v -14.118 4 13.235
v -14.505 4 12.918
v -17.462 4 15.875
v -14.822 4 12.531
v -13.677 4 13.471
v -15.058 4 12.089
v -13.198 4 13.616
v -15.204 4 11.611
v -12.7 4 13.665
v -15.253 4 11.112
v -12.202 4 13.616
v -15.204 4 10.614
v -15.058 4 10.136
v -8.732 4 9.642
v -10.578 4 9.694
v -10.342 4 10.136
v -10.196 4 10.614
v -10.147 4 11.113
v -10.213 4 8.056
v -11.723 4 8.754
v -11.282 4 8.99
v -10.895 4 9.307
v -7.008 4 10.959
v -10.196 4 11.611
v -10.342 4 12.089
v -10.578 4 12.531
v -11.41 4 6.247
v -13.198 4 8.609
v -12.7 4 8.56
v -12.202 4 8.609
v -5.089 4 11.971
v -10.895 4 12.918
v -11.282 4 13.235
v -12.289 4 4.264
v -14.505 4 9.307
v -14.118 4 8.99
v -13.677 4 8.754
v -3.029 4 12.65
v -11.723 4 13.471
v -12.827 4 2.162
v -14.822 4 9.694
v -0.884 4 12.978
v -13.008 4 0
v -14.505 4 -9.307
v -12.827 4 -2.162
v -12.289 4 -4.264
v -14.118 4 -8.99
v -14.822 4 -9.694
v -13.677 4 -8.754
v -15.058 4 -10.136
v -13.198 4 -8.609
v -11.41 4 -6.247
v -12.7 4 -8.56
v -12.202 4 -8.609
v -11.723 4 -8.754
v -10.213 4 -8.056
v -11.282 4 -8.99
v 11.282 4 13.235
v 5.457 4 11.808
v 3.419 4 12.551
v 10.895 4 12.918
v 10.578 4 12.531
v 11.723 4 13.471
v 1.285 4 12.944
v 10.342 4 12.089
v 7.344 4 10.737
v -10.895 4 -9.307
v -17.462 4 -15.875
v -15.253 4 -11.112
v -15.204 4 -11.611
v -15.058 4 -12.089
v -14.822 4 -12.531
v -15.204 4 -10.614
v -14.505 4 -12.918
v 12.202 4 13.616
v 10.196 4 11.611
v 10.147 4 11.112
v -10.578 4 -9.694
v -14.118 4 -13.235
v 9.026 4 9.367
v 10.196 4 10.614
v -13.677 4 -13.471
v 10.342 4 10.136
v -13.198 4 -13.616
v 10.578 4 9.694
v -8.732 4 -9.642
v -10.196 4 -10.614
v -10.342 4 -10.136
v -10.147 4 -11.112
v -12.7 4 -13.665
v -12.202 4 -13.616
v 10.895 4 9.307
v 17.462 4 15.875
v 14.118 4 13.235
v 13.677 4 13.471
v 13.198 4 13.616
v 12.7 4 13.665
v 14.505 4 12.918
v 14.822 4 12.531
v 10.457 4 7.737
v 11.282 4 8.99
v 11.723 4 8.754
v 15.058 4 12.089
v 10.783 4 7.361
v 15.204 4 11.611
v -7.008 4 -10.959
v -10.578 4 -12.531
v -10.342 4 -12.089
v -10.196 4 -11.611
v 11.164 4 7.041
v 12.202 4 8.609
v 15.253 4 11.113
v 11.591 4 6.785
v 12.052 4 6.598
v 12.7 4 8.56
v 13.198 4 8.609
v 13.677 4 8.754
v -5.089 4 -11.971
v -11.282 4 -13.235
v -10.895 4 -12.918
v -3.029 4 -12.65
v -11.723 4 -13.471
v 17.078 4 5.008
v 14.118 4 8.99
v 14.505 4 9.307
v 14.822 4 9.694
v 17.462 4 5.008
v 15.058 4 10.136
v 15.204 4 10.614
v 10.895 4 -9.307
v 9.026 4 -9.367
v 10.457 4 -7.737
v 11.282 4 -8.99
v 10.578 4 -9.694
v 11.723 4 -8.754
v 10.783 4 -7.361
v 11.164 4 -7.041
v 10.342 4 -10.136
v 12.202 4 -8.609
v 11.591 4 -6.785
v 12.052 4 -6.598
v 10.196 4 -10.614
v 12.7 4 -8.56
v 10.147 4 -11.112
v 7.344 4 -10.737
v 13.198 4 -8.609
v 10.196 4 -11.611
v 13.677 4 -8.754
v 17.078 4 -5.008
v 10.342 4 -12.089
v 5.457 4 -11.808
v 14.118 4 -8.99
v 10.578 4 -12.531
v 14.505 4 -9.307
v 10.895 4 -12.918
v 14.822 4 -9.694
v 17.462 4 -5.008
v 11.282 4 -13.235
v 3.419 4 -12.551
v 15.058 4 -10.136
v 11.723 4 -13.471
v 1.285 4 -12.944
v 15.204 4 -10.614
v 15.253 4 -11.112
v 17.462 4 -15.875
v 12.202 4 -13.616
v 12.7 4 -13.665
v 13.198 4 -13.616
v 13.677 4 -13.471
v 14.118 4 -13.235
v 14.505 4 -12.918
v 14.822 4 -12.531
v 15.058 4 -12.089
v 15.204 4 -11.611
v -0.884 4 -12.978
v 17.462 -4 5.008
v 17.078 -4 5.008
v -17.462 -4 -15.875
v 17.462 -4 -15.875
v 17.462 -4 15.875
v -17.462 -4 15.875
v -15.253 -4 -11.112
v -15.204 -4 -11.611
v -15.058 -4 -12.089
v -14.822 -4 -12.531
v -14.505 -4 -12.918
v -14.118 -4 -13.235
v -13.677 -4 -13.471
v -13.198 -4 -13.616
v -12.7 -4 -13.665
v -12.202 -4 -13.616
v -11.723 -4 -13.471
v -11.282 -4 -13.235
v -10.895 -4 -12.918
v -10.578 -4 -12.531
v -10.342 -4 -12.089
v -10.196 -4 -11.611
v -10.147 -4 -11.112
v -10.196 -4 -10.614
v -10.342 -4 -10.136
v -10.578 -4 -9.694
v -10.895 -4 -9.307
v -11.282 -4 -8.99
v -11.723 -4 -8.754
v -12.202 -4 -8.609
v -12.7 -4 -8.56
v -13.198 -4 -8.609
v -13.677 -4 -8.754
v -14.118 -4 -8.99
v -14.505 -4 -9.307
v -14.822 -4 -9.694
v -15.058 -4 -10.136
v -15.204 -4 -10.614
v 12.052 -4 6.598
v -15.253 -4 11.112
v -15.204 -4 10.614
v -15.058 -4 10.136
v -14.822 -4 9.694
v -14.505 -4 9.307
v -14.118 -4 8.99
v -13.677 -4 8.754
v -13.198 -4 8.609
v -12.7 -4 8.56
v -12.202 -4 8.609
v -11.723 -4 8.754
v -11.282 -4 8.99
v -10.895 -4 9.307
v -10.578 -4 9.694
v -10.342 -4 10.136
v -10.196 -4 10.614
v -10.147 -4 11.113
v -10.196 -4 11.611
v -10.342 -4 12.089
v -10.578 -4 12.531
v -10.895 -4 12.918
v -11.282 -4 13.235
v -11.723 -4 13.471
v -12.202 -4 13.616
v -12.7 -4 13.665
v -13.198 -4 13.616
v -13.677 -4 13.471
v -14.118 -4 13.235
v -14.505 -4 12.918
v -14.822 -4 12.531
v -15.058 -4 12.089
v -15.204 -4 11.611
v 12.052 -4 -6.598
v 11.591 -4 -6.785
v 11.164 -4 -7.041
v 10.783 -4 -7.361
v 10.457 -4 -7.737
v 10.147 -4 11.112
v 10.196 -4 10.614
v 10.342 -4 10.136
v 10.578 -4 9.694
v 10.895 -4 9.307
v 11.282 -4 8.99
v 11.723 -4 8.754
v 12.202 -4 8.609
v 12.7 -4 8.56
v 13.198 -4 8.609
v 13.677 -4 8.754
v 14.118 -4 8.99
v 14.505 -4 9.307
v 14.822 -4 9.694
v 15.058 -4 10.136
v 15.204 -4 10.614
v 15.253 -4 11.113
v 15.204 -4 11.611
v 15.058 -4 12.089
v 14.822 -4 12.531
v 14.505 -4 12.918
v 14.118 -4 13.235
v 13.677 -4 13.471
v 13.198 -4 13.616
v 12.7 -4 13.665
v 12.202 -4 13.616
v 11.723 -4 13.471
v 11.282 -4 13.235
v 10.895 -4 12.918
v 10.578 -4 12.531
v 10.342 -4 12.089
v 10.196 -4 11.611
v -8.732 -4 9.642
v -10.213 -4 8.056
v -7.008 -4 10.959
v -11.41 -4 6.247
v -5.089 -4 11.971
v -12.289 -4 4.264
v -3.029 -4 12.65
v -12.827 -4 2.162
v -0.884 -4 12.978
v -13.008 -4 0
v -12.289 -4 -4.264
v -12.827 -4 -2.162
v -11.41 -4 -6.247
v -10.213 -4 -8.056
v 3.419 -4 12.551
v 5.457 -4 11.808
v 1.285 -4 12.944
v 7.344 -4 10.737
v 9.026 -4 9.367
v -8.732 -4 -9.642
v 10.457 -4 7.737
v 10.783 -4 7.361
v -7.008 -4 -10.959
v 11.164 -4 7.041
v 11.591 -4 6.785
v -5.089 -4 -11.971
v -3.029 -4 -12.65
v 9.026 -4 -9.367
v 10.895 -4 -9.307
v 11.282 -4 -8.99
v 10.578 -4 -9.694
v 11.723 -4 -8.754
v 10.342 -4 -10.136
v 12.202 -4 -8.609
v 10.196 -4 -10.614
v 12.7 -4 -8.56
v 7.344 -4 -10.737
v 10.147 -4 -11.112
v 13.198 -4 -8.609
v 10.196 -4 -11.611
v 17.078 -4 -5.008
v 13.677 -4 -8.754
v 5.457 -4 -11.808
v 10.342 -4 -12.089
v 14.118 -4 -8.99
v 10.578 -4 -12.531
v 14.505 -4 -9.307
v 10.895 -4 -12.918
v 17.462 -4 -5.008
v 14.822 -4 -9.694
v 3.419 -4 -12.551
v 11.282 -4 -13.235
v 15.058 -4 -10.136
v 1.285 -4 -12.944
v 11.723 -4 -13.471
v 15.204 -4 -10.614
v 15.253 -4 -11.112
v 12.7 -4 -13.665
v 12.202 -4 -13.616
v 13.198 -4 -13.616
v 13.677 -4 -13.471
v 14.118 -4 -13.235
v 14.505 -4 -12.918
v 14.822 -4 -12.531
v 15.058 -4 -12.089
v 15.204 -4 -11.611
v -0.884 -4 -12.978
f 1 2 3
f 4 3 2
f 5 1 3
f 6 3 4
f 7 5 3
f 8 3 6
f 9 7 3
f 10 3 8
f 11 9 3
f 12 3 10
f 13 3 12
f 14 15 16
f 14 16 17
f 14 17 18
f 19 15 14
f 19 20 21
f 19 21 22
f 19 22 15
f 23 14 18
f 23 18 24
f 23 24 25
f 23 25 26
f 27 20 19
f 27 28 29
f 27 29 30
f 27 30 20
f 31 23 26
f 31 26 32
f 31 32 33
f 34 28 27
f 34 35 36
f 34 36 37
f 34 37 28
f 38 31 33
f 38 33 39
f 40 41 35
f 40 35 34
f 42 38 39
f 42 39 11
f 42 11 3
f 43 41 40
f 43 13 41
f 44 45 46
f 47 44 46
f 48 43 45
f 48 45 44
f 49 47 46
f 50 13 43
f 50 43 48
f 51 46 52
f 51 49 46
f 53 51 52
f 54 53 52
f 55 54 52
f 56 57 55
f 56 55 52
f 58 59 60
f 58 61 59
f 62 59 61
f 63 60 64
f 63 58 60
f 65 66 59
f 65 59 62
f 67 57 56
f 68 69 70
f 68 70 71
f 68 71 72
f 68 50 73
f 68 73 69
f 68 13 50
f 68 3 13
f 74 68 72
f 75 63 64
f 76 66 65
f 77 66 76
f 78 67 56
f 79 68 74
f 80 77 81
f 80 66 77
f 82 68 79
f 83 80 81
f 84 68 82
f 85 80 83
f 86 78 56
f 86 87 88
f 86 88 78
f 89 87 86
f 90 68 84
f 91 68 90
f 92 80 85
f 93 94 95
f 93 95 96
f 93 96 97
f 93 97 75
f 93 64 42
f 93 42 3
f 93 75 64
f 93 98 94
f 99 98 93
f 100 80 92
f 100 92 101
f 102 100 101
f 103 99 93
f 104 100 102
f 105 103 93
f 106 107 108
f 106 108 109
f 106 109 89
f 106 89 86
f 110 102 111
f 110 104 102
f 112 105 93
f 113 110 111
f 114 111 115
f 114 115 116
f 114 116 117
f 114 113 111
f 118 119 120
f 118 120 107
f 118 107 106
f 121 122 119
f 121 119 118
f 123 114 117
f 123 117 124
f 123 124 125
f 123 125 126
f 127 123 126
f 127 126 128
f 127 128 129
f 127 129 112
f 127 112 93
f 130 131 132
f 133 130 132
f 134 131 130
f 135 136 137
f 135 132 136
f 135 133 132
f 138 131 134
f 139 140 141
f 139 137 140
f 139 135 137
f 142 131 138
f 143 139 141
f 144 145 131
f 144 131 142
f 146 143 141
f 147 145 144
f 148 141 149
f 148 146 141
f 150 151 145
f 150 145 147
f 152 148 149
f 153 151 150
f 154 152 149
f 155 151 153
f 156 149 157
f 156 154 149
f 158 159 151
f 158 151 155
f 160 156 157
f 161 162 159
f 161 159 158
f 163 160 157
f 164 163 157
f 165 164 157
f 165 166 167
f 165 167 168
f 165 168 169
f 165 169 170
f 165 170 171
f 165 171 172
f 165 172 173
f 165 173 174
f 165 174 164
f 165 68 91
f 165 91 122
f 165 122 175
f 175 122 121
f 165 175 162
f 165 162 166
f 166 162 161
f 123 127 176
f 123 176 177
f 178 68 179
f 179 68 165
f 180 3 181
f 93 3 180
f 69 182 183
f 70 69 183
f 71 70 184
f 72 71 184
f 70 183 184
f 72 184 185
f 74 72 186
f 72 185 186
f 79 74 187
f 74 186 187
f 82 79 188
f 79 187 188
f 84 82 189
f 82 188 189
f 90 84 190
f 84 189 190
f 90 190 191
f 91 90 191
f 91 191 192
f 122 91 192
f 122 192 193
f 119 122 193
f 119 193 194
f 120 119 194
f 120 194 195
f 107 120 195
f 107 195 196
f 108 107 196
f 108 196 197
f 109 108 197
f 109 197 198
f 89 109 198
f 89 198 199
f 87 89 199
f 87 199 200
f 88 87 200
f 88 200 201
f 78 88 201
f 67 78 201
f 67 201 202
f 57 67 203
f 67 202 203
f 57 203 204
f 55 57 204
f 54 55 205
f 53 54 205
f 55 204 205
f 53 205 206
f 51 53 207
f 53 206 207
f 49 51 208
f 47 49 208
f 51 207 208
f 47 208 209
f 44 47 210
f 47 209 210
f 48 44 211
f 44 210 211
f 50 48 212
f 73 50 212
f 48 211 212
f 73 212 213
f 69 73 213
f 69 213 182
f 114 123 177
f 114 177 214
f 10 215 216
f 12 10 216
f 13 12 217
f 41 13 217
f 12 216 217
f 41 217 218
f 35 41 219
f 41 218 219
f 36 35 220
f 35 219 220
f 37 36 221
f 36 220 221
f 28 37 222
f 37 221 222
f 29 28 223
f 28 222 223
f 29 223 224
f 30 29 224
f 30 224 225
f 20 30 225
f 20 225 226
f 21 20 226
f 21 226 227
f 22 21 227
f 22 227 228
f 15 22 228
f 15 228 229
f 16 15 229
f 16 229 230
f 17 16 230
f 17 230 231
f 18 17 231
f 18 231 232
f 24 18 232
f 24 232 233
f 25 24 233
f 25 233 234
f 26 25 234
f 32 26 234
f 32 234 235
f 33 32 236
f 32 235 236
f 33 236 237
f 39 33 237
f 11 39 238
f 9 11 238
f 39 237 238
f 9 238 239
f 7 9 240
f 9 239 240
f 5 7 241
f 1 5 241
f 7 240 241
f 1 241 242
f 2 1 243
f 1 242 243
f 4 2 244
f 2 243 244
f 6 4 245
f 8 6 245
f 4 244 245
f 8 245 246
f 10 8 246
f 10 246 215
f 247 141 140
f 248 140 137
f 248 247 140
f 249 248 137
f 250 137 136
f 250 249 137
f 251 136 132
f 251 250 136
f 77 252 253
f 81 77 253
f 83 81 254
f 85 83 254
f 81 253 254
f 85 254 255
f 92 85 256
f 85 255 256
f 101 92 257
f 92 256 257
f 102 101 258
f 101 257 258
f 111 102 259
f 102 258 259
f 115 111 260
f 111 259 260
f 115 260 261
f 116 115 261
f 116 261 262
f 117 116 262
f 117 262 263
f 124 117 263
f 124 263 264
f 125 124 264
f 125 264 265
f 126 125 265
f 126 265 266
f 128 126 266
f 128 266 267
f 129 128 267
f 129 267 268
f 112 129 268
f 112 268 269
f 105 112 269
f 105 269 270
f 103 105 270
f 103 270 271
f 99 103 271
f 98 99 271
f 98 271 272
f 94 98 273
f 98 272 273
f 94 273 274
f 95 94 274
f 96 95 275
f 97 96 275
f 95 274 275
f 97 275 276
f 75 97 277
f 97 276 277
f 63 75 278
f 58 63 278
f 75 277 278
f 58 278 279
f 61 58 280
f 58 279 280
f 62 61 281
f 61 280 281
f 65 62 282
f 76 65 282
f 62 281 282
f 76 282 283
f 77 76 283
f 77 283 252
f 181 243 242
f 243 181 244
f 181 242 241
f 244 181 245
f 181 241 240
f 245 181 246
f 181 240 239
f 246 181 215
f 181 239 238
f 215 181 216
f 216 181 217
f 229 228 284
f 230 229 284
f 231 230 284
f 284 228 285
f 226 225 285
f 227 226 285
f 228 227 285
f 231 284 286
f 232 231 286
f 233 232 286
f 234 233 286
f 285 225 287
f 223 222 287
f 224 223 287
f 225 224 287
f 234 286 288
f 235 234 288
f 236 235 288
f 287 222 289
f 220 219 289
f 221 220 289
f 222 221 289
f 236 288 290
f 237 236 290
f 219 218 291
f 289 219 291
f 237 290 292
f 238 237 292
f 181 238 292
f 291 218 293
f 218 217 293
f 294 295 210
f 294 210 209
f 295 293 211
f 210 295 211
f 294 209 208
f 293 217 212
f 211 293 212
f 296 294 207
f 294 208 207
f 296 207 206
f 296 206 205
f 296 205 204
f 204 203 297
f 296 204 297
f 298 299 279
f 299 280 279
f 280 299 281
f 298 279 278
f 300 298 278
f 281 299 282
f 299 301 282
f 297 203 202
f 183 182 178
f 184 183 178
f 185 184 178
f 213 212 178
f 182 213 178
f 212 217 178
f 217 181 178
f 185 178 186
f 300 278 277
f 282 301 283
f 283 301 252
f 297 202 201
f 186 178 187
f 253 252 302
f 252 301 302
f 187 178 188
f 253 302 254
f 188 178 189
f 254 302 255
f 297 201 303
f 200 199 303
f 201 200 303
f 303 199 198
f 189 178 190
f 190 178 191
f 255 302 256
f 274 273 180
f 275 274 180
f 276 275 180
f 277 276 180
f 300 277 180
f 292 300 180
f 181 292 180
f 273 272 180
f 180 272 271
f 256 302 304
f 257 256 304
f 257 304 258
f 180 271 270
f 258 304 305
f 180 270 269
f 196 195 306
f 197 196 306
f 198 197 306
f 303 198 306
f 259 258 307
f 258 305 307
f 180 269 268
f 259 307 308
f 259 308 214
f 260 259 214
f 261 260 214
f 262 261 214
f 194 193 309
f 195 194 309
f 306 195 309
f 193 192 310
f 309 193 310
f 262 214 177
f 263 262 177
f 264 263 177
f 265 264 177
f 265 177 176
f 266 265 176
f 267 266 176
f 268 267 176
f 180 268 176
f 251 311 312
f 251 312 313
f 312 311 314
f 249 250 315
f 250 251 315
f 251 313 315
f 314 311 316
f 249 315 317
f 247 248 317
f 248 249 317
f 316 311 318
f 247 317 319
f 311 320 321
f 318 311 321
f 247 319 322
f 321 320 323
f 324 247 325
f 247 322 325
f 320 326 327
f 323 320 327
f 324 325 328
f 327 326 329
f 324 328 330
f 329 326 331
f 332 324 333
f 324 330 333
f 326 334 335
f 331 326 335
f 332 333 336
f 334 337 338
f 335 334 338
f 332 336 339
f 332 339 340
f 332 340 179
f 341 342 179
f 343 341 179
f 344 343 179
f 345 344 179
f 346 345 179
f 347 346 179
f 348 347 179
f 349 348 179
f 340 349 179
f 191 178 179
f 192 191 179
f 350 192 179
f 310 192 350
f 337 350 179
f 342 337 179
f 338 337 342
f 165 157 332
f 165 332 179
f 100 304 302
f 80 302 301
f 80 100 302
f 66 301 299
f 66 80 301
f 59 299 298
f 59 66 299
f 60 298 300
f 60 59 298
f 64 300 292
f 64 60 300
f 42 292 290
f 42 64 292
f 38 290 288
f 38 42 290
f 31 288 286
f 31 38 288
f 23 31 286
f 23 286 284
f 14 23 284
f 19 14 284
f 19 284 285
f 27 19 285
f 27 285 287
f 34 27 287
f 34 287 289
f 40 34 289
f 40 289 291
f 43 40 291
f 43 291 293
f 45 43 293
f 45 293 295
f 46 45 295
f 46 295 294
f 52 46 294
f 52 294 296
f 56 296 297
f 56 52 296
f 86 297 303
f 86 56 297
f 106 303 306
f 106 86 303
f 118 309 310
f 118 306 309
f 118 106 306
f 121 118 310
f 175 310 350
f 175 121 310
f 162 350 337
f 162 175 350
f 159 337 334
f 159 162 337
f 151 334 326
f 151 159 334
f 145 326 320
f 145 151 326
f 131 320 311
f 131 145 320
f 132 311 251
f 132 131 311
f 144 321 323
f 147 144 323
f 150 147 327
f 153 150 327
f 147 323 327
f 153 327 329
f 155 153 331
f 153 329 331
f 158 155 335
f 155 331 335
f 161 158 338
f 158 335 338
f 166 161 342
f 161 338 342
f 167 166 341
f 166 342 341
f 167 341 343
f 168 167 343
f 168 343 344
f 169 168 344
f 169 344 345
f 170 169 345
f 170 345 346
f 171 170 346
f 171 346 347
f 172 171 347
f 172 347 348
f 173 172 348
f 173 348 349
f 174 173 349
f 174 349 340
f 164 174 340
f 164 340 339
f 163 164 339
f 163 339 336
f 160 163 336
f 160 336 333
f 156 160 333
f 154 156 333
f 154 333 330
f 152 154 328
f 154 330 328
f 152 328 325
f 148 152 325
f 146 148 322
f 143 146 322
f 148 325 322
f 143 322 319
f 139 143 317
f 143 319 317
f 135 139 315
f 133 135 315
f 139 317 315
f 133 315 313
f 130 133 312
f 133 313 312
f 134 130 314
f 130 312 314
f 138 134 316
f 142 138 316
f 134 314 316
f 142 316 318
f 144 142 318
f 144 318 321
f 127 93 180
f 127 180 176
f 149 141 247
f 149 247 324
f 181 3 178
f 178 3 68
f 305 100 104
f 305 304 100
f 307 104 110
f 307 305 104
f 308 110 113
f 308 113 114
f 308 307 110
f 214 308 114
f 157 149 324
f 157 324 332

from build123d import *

# Parameters (mm, degrees)
SKETCH1_W              = 34.925
SKETCH1_H              = 31.75
PLATE_DEPTH            = 4
F_10_CLEARANCE_HOLE1_D = 5.1054
LOAD_CELL_CUTOUT_REACH = 26.919
FILLET1_R              = 3.175


with BuildPart() as part:
    # Sketch1 → Plate (new, symmetric)
    with BuildSketch(Plane(origin=(0, 0, 0), x_dir=(1, 0, 0), z_dir=(0, 1, 0))):
        Rectangle(SKETCH1_W, SKETCH1_H)
    extrude(amount=PLATE_DEPTH, both=True)

    # #10 Clearance Hole1 (through all)
    with Locations(Plane(origin=(0, 4, 0), x_dir=(1, 0, 0), z_dir=(0, 1, 0))):
        with Locations((-12.7, 11.1125), (12.7, 11.1125), (12.7, -11.1125), (-12.7, -11.1125)):
            Hole(F_10_CLEARANCE_HOLE1_D / 2)

    # Sketch4 → Load Cell Cutout (cut, up to next)
    with BuildSketch(Plane(origin=(0, 4, 0), x_dir=(1, 0, 0), z_dir=(0, 1, 0)), mode=Mode.PRIVATE) as load_cell_cutout_sk1:
        with BuildLine():
            Line((11.009869163, 6.927542495), (17.078427656, 5.008))
            Line((17.078427656, 5.008), (22.733, 5.008))
            Line((22.733, 5.008), (22.733, -5.008))
            Line((22.733, -5.008), (17.078427656, -5.008))
            Line((17.078427656, -5.008), (11.009869163, -6.927542495))
            ThreePointArc((11.009869163, -6.927542495), (-13.008, 0), (11.009869163, 6.927542495))
        make_face()
    load_cell_cutout_tool1 = extrude(load_cell_cutout_sk1.sketch, amount=-LOAD_CELL_CUTOUT_REACH, mode=Mode.PRIVATE) & part.part
    add(load_cell_cutout_tool1.solids().sort_by_distance((2.977457, 4, 0))[0], mode=Mode.SUBTRACT)

    # Fillet1
    fillet1_edges = [part.edges().sort_by_distance(p)[0] for p in [
        (11.009869163, 0, 6.927542495),
        (11.009869163, 0, -6.927542495),
    ]]
    fillet(fillet1_edges, radius=FILLET1_R)


solid = part.part
